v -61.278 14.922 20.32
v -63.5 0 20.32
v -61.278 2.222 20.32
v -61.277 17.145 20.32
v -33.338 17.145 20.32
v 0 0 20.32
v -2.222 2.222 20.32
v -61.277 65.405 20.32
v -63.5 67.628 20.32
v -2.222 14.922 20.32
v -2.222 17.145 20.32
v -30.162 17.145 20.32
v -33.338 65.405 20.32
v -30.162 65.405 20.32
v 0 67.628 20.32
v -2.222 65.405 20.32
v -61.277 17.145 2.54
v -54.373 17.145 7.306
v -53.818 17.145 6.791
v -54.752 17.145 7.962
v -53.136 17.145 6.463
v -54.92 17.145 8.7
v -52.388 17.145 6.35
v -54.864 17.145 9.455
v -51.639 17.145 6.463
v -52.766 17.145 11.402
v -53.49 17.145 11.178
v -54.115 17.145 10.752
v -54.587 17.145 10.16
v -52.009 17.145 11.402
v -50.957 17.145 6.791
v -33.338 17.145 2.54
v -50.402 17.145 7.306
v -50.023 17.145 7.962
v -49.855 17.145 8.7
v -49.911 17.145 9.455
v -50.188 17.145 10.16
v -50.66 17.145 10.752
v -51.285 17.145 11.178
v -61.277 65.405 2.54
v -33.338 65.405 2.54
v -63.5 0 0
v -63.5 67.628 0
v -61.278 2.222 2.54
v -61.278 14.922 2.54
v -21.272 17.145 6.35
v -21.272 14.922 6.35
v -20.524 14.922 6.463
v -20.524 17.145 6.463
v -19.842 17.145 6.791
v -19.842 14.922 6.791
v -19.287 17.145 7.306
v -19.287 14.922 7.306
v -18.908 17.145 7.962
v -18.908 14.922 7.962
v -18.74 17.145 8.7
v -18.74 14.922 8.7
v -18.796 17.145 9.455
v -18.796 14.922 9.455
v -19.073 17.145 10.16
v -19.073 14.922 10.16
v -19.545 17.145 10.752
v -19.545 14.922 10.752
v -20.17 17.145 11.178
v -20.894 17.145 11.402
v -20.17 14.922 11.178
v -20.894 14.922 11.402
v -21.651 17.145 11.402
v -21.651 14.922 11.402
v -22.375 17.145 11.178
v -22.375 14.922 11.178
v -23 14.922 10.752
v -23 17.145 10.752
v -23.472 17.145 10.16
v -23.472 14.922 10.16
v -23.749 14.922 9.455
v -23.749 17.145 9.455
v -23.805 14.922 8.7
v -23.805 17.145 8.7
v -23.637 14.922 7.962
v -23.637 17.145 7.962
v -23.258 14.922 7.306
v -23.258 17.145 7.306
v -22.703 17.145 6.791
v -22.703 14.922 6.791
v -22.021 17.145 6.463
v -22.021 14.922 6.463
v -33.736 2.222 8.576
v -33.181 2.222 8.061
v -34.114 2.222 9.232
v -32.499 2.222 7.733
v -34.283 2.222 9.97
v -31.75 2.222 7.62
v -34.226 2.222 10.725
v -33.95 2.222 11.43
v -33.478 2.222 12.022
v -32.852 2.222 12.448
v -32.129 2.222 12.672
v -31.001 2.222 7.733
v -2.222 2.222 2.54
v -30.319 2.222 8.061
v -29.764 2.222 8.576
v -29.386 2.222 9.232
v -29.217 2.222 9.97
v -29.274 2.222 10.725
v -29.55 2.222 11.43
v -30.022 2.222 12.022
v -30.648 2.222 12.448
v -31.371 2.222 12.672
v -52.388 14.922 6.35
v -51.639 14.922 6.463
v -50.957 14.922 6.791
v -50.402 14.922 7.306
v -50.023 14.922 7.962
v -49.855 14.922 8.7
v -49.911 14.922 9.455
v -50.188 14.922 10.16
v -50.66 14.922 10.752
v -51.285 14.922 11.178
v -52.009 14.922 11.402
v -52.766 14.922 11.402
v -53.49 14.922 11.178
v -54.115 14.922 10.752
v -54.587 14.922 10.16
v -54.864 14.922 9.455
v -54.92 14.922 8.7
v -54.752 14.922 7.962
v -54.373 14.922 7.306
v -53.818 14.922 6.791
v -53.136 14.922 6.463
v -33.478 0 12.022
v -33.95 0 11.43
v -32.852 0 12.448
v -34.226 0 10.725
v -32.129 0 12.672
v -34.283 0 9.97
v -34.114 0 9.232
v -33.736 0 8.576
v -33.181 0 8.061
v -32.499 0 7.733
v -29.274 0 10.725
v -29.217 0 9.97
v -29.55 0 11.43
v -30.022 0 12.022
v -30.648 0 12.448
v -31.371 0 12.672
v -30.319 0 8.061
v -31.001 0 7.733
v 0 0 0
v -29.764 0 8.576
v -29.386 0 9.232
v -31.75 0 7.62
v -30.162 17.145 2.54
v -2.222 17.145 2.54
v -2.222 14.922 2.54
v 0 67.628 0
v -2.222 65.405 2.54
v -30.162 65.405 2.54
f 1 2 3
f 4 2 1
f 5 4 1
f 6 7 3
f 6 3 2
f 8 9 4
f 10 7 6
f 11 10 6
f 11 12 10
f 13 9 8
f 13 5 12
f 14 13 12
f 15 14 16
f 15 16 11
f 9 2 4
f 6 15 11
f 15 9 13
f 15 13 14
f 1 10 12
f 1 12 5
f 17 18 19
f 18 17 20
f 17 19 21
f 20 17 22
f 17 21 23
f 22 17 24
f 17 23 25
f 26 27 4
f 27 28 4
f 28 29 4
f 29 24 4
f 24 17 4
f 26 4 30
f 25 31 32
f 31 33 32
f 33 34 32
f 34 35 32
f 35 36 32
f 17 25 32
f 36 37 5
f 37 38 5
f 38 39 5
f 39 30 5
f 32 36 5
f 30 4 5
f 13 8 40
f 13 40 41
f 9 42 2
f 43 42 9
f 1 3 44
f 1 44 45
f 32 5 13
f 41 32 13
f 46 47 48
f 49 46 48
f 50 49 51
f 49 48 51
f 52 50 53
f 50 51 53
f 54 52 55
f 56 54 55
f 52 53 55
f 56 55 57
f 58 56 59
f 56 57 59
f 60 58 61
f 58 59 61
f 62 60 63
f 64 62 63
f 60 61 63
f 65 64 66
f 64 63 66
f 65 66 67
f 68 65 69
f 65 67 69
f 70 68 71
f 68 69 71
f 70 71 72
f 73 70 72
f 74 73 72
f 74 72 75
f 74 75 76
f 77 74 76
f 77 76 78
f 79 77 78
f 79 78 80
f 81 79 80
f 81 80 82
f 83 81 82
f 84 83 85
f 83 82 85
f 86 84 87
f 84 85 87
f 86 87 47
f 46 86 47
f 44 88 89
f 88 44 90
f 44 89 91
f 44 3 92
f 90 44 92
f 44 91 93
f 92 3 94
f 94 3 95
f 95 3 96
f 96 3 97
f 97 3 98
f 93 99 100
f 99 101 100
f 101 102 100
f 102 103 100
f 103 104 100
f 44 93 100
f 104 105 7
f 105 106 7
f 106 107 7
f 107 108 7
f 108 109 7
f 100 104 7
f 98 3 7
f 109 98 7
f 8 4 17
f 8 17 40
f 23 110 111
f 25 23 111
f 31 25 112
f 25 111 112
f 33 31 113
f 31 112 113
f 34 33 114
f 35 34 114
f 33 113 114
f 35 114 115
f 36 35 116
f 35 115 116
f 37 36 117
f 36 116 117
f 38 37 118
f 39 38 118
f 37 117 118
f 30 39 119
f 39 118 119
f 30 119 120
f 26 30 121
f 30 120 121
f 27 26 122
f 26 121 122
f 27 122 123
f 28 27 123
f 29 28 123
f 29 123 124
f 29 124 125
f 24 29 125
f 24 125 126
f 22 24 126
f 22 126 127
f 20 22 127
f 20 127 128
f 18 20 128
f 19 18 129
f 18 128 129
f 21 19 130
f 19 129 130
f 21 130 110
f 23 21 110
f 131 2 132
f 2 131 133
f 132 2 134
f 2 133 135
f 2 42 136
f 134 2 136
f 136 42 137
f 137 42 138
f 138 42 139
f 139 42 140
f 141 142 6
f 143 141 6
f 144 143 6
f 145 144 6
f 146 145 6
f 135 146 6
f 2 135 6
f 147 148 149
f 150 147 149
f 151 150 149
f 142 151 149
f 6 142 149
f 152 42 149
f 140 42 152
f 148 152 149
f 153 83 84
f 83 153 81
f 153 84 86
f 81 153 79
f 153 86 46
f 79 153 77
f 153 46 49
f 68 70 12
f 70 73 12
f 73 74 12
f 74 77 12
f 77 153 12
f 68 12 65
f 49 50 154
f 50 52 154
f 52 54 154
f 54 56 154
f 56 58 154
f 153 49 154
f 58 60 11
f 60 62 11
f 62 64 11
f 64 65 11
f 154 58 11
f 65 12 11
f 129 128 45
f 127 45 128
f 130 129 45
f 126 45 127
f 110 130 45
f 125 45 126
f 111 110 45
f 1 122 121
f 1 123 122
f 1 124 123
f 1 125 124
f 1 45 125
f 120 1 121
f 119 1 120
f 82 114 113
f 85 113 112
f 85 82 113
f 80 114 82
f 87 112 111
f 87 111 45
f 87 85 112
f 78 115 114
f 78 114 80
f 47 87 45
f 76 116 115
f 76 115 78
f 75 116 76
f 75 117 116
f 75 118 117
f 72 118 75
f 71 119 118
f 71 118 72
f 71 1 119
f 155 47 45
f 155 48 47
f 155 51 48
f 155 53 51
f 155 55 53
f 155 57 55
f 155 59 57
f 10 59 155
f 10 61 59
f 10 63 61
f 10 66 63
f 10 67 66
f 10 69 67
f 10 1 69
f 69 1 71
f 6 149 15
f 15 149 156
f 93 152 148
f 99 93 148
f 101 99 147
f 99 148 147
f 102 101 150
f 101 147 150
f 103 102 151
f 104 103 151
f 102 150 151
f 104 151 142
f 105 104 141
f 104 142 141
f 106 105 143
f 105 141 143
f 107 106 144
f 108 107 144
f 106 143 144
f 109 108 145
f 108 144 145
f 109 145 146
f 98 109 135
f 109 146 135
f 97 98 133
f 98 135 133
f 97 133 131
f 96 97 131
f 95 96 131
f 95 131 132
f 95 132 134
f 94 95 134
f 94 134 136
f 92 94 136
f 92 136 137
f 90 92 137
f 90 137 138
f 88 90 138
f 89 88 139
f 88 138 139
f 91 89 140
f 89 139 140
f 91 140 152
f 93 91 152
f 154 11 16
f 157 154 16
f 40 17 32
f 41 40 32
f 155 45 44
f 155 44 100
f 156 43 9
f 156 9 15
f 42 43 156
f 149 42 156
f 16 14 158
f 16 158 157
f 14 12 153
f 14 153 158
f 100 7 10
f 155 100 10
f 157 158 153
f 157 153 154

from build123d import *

# Parameters (mm, degrees)
SKETCH3_W           = 63.5
SKETCH3_H           = 67.6275
BOSS_EXTRUDE3_DEPTH = 20.32
SKETCH1_W           = 27.94
SKETCH1_H           = 48.26
SKETCH1_W_2         = 59.055
SKETCH1_H_2         = 12.7
CUT_EXTRUDE1_DEPTH  = 17.78
SKETCH4_R           = 2.54
CUT_EXTRUDE2_DEPTH  = 2.2225
SKETCH5_R           = 2.54
CUT_EXTRUDE3_DEPTH  = 2.2225


with BuildPart() as part:
    # Sketch3 → Boss-Extrude3 (new body)
    with BuildSketch(Plane.XY):
        with Locations((-31.75, 33.81375)):
            Rectangle(SKETCH3_W, SKETCH3_H)
    extrude(amount=BOSS_EXTRUDE3_DEPTH)

    # Sketch1 → Cut-Extrude1 (cut)
    with BuildSketch(Plane.XY.offset(20.32)):
        with Locations((-47.3075, 41.275)):
            Rectangle(SKETCH1_W, SKETCH1_H)
        with Locations((-16.1925, 41.275)):
            Rectangle(SKETCH1_W, SKETCH1_H)
        with Locations((-31.75, 8.5725)):
            Rectangle(SKETCH1_W_2, SKETCH1_H_2)
    extrude(amount=-CUT_EXTRUDE1_DEPTH, mode=Mode.SUBTRACT)

    # Sketch4 → Cut-Extrude2 (cut)
    with BuildSketch(Plane.XZ):
        with Locations(Location((-31.75, 10.16, 0), (0, 0, 270))):
            Circle(SKETCH4_R)
    extrude(amount=-CUT_EXTRUDE2_DEPTH, mode=Mode.SUBTRACT)

    # Sketch5 → Cut-Extrude3 (cut)
    with BuildSketch(Plane(origin=(0, 14.9225, 0), x_dir=(-1, 0, 0), z_dir=(0, -1, 0))):
        with Locations(Location((52.3875, -8.89, 0), (0, 0, 90))):
            Circle(SKETCH5_R)
        with Locations(Location((21.2725, -8.89, 0), (0, 0, 90))):
            Circle(SKETCH5_R)
    extrude(amount=-CUT_EXTRUDE3_DEPTH, mode=Mode.SUBTRACT)


solid = part.part
